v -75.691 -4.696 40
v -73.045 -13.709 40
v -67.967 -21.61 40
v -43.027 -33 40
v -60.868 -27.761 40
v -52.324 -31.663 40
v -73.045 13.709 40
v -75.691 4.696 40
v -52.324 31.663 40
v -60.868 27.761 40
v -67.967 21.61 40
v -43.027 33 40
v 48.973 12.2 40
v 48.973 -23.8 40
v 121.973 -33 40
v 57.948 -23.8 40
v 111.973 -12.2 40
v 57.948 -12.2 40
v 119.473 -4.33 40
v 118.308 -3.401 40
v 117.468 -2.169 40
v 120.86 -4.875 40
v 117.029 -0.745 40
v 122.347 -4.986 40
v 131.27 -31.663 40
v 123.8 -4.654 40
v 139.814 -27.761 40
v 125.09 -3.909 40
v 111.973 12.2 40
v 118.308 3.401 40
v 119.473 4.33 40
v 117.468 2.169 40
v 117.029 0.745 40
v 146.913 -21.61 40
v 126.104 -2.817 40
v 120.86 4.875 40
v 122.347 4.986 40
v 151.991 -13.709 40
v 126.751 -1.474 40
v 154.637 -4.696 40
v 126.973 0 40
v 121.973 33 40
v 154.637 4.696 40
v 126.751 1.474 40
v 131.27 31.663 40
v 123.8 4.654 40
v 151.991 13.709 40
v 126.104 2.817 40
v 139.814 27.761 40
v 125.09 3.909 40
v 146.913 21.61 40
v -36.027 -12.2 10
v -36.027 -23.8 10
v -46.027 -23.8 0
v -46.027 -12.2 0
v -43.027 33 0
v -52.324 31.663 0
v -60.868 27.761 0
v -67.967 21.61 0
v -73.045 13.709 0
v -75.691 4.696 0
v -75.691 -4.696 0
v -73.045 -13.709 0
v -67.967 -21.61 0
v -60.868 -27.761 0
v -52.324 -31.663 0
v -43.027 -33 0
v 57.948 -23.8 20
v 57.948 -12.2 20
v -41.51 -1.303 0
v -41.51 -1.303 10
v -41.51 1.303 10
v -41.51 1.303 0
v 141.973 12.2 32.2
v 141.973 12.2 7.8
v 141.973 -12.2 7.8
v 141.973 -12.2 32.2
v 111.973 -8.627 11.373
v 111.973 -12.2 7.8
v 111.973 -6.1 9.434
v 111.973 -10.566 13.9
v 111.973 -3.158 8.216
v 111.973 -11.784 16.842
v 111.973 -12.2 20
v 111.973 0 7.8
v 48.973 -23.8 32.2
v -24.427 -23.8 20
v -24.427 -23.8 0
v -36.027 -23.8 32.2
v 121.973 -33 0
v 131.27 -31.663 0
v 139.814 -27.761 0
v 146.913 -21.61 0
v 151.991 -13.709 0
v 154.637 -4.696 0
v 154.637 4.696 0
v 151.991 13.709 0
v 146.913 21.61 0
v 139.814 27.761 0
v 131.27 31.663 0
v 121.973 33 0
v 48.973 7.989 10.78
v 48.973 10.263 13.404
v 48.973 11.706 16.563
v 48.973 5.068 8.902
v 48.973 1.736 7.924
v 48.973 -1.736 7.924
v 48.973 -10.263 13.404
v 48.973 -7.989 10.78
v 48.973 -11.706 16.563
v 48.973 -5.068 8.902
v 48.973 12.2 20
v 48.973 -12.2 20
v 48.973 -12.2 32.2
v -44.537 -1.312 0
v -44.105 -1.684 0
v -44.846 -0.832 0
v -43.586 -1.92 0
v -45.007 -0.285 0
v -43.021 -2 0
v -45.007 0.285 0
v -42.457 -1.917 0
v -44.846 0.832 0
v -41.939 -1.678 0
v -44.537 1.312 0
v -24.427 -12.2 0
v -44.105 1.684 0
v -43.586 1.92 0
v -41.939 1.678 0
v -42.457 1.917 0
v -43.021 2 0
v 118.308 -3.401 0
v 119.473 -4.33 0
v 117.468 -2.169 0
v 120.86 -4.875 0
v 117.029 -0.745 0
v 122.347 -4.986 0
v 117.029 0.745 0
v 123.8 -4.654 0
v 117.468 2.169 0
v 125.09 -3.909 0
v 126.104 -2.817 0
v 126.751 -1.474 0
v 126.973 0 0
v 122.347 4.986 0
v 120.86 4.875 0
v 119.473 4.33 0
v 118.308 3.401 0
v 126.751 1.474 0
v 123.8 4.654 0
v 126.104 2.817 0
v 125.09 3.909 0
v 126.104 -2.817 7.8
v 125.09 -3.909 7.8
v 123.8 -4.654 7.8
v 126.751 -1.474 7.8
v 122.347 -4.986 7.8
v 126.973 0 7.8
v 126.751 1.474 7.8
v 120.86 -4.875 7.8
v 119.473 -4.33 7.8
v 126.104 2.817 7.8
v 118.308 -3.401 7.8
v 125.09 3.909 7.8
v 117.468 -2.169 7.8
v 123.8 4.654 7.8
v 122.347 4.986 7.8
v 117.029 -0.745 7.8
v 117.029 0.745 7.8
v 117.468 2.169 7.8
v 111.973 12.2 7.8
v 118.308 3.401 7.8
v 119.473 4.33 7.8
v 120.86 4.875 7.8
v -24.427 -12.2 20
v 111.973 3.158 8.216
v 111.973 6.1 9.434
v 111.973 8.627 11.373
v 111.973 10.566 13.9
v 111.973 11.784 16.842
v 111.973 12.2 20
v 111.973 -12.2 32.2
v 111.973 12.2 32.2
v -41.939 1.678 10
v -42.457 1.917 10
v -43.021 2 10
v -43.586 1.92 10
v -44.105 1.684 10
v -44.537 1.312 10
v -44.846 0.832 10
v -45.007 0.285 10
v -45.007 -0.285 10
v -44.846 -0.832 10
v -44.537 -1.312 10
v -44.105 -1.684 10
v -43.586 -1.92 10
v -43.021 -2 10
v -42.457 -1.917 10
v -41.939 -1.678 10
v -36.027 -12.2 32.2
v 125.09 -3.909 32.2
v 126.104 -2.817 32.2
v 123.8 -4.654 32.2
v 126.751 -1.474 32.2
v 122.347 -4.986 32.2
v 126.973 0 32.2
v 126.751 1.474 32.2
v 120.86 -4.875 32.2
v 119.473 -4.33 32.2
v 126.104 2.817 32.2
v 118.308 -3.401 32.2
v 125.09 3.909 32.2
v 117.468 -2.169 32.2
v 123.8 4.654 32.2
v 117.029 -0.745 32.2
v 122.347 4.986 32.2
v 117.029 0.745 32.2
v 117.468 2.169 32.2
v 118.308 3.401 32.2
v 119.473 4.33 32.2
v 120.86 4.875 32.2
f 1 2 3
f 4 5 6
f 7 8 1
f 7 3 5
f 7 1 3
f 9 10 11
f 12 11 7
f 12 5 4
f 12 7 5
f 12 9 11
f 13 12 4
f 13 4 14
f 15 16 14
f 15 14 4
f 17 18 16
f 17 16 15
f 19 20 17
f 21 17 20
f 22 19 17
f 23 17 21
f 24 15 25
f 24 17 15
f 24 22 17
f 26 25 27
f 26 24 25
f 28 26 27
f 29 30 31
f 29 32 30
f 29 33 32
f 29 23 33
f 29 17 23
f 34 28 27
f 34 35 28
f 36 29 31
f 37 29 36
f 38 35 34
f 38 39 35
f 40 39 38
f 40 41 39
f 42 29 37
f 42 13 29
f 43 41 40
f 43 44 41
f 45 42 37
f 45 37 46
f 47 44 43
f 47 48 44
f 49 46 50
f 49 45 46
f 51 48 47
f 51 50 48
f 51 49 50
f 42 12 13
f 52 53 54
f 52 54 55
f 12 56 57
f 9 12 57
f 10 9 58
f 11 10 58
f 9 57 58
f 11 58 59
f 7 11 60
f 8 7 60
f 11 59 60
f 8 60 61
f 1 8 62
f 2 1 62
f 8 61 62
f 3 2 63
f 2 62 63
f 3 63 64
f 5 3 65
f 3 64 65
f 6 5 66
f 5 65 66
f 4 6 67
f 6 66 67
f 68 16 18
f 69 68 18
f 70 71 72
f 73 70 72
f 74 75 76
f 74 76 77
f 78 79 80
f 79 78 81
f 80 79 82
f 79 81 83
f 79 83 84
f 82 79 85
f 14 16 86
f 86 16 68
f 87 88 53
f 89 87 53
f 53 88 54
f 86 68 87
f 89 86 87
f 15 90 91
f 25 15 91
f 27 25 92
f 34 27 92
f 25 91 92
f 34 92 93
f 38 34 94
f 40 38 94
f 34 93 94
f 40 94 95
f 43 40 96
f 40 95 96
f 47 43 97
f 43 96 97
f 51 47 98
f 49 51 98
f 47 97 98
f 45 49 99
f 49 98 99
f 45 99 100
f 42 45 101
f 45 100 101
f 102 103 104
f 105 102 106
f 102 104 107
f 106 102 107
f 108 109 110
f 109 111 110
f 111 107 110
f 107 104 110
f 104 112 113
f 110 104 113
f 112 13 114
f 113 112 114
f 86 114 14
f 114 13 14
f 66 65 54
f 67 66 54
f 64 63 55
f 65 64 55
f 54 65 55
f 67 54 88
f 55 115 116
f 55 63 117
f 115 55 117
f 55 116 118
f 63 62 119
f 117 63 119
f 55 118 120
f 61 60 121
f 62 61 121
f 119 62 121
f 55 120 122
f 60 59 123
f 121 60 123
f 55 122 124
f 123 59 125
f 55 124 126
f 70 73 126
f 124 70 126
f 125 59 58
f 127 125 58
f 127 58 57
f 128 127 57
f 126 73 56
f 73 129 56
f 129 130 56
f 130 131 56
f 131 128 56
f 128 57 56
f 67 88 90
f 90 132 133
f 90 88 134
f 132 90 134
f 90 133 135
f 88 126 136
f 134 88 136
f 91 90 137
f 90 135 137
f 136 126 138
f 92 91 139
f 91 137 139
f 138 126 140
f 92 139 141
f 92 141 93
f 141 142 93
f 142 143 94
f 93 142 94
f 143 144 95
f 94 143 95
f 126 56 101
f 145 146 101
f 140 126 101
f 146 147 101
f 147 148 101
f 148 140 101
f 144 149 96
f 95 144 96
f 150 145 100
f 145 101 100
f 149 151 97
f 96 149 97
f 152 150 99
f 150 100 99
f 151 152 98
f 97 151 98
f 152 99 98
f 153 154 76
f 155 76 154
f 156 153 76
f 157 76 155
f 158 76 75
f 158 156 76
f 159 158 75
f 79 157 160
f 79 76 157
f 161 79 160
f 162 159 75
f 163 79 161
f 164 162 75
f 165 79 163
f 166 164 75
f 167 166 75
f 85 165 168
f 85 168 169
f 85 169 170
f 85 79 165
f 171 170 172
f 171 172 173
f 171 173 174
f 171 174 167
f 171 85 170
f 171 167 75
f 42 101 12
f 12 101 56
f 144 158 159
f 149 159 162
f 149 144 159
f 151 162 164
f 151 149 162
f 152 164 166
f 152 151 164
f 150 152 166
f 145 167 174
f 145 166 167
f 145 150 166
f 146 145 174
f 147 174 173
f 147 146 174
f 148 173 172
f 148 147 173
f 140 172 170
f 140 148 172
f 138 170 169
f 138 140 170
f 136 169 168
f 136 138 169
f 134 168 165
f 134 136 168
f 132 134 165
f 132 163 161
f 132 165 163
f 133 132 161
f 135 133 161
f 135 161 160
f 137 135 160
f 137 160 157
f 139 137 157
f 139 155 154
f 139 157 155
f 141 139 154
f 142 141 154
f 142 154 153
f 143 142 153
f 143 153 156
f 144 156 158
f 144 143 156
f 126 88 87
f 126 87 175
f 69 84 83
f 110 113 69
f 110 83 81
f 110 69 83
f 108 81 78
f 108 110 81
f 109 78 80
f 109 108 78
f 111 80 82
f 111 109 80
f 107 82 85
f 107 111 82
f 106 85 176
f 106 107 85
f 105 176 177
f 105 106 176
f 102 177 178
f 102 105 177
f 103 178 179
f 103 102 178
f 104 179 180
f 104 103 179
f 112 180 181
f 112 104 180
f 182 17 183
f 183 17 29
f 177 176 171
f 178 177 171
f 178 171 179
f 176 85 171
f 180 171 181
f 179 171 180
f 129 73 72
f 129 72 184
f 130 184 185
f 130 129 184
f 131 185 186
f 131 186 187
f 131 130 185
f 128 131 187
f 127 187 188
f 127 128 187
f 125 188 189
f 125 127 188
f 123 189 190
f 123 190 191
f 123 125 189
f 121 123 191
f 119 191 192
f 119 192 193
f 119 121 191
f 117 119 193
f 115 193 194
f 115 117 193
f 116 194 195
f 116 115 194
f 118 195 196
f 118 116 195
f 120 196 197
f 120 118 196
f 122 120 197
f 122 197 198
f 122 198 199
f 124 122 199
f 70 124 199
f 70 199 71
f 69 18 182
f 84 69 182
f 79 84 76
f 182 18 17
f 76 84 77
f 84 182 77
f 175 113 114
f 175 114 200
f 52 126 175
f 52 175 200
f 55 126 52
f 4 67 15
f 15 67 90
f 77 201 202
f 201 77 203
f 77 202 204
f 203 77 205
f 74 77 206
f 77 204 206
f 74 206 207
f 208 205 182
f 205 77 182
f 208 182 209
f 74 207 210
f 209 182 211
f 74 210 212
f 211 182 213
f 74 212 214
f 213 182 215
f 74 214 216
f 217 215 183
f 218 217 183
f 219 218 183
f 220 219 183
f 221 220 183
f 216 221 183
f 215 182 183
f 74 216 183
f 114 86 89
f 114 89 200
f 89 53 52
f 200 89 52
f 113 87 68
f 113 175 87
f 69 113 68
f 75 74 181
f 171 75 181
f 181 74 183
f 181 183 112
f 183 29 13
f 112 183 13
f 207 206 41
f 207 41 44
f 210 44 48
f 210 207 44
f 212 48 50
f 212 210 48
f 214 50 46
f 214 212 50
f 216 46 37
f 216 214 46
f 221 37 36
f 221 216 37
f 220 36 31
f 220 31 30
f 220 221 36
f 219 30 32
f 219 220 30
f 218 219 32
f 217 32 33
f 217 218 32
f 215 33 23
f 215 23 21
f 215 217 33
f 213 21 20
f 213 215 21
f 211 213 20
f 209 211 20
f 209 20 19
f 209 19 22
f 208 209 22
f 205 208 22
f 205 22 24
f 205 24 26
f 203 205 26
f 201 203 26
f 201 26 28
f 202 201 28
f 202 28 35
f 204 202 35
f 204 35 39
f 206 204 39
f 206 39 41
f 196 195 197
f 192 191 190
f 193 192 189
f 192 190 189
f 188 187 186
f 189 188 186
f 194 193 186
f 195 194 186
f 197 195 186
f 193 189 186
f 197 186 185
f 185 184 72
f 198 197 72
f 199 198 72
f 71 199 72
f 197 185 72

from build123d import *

# Parameters (mm, degrees)
CROQUIS1_R              = 5
SALIENTE_EXTRUIR1_DEPTH = 40
CORTAR_EXTRUIR2_DEPTH   = 10
CORTAR_EXTRUIR4_DEPTH   = 20
CROQUIS6_R              = 12.2
CORTAR_EXTRUIR6_DEPTH   = 63
CROQUIS7_W              = 24.4
CROQUIS7_H              = 24.4
CORTAR_EXTRUIR9_DEPTH   = 30
CROQUIS8_W              = 12.2
CROQUIS8_H              = 11.6
CORTAR_EXTRUIR10_DEPTH  = 85
CORTAR_EXTRUIR11_REACH  = 165.418
CROQUIS9_W              = 11.6
CROQUIS9_H              = 11.6
CHAFL_N1_SIZE           = 10


with BuildPart() as part:
    # Croquis1 → Saliente-Extruir1 (new body)
    with BuildSketch(Plane.XY):
        with BuildLine():
            Line((121.972889038, 33), (-43.027110962, 33))
            ThreePointArc((-43.027110962, 33), (-76.027110962, 0), (-43.027110962, -33))
            Line((-43.027110962, -33), (121.972889038, -33))
            ThreePointArc((121.972889038, -33), (154.972889038, 0), (121.972889038, 33))
        make_face()
        with Locations((121.972889038, 0)):
            Circle(CROQUIS1_R, mode=Mode.SUBTRACT)
    extrude(amount=SALIENTE_EXTRUIR1_DEPTH)

    # Croquis1<4> → Cortar-Extruir2 (cut)
    with BuildSketch(Plane.XY):
        with BuildLine():
            Line((-41.509889959, -1.303088803), (-41.509889959, 1.303088803))
            ThreePointArc((-41.509889959, 1.303088803), (-45.027110962, 0), (-41.509889959, -1.303088803))
        make_face()
    extrude(amount=CORTAR_EXTRUIR2_DEPTH, mode=Mode.SUBTRACT)

    # Croquis5 → Cortar-Extruir4 (cut)
    with BuildSketch(Plane.XY.offset(40)):
        Polygon((111.972889038, -12.2), (111.972889038, 12.2), (48.972889038, 12.2), (48.972889038, -23.8), (57.948493167, -23.8), (57.948493167, -12.2), align=None)
    extrude(amount=-CORTAR_EXTRUIR4_DEPTH, mode=Mode.SUBTRACT)

    # Croquis6 → Cortar-Extruir6 (cut)
    with BuildSketch(Plane(origin=(48.972889038, 0, 0), x_dir=(0, 0, -1), z_dir=(1, 0, 0))):
        with Locations((-20, 0)):
            Circle(CROQUIS6_R)
        with BuildLine():
            ThreePointArc((-20, -12.2), (-32.2, 0), (-20, 12.2))
            Line((-20, 12.2), (-40, 12.2))
            Line((-40, 12.2), (-40, -12.2))
            Line((-40, -12.2), (-20, -12.2))
        make_face()
    extrude(amount=CORTAR_EXTRUIR6_DEPTH, mode=Mode.SUBTRACT)

    # Croquis7 → Cortar-Extruir9 (cut)
    with BuildSketch(Plane.ZY.offset(-111.972889038)):
        with Locations((20, 0)):
            Rectangle(CROQUIS7_W, CROQUIS7_H)
    extrude(amount=-CORTAR_EXTRUIR9_DEPTH, mode=Mode.SUBTRACT)

    # Croquis8 → Cortar-Extruir10 (cut)
    with BuildSketch(Plane(origin=(48.972889038, 0, 0), x_dir=(0, 0, -1), z_dir=(1, 0, 0))):
        with Locations((-26.1, -18)):
            Rectangle(CROQUIS8_W, CROQUIS8_H)
    extrude(amount=-CORTAR_EXTRUIR10_DEPTH, mode=Mode.SUBTRACT)

    # Croquis9 → Cortar-Extruir11 (cut, up to next)
    with BuildSketch(Plane(origin=(0, 0, 0), x_dir=(-1, 0, 0), z_dir=(0, 0, -1)), mode=Mode.PRIVATE) as cortar_extruir11_sk1:
        with Locations((30.227110962, -18)):
            Rectangle(CROQUIS9_W, CROQUIS9_H)
    cortar_extruir11_tool1 = extrude(cortar_extruir11_sk1.sketch, amount=-CORTAR_EXTRUIR11_REACH, mode=Mode.PRIVATE) & part.part
    add(cortar_extruir11_tool1.solids().sort_by_distance((-30.227111, -18, 0))[0], mode=Mode.SUBTRACT)

    # Chaflán1
    chafl_n1_edges = [part.edges().sort_by_distance(p)[0] for p in [
        (-36.027110962, -18, 0),
    ]]
    chamfer(chafl_n1_edges, length=CHAFL_N1_SIZE)


solid = part.part
